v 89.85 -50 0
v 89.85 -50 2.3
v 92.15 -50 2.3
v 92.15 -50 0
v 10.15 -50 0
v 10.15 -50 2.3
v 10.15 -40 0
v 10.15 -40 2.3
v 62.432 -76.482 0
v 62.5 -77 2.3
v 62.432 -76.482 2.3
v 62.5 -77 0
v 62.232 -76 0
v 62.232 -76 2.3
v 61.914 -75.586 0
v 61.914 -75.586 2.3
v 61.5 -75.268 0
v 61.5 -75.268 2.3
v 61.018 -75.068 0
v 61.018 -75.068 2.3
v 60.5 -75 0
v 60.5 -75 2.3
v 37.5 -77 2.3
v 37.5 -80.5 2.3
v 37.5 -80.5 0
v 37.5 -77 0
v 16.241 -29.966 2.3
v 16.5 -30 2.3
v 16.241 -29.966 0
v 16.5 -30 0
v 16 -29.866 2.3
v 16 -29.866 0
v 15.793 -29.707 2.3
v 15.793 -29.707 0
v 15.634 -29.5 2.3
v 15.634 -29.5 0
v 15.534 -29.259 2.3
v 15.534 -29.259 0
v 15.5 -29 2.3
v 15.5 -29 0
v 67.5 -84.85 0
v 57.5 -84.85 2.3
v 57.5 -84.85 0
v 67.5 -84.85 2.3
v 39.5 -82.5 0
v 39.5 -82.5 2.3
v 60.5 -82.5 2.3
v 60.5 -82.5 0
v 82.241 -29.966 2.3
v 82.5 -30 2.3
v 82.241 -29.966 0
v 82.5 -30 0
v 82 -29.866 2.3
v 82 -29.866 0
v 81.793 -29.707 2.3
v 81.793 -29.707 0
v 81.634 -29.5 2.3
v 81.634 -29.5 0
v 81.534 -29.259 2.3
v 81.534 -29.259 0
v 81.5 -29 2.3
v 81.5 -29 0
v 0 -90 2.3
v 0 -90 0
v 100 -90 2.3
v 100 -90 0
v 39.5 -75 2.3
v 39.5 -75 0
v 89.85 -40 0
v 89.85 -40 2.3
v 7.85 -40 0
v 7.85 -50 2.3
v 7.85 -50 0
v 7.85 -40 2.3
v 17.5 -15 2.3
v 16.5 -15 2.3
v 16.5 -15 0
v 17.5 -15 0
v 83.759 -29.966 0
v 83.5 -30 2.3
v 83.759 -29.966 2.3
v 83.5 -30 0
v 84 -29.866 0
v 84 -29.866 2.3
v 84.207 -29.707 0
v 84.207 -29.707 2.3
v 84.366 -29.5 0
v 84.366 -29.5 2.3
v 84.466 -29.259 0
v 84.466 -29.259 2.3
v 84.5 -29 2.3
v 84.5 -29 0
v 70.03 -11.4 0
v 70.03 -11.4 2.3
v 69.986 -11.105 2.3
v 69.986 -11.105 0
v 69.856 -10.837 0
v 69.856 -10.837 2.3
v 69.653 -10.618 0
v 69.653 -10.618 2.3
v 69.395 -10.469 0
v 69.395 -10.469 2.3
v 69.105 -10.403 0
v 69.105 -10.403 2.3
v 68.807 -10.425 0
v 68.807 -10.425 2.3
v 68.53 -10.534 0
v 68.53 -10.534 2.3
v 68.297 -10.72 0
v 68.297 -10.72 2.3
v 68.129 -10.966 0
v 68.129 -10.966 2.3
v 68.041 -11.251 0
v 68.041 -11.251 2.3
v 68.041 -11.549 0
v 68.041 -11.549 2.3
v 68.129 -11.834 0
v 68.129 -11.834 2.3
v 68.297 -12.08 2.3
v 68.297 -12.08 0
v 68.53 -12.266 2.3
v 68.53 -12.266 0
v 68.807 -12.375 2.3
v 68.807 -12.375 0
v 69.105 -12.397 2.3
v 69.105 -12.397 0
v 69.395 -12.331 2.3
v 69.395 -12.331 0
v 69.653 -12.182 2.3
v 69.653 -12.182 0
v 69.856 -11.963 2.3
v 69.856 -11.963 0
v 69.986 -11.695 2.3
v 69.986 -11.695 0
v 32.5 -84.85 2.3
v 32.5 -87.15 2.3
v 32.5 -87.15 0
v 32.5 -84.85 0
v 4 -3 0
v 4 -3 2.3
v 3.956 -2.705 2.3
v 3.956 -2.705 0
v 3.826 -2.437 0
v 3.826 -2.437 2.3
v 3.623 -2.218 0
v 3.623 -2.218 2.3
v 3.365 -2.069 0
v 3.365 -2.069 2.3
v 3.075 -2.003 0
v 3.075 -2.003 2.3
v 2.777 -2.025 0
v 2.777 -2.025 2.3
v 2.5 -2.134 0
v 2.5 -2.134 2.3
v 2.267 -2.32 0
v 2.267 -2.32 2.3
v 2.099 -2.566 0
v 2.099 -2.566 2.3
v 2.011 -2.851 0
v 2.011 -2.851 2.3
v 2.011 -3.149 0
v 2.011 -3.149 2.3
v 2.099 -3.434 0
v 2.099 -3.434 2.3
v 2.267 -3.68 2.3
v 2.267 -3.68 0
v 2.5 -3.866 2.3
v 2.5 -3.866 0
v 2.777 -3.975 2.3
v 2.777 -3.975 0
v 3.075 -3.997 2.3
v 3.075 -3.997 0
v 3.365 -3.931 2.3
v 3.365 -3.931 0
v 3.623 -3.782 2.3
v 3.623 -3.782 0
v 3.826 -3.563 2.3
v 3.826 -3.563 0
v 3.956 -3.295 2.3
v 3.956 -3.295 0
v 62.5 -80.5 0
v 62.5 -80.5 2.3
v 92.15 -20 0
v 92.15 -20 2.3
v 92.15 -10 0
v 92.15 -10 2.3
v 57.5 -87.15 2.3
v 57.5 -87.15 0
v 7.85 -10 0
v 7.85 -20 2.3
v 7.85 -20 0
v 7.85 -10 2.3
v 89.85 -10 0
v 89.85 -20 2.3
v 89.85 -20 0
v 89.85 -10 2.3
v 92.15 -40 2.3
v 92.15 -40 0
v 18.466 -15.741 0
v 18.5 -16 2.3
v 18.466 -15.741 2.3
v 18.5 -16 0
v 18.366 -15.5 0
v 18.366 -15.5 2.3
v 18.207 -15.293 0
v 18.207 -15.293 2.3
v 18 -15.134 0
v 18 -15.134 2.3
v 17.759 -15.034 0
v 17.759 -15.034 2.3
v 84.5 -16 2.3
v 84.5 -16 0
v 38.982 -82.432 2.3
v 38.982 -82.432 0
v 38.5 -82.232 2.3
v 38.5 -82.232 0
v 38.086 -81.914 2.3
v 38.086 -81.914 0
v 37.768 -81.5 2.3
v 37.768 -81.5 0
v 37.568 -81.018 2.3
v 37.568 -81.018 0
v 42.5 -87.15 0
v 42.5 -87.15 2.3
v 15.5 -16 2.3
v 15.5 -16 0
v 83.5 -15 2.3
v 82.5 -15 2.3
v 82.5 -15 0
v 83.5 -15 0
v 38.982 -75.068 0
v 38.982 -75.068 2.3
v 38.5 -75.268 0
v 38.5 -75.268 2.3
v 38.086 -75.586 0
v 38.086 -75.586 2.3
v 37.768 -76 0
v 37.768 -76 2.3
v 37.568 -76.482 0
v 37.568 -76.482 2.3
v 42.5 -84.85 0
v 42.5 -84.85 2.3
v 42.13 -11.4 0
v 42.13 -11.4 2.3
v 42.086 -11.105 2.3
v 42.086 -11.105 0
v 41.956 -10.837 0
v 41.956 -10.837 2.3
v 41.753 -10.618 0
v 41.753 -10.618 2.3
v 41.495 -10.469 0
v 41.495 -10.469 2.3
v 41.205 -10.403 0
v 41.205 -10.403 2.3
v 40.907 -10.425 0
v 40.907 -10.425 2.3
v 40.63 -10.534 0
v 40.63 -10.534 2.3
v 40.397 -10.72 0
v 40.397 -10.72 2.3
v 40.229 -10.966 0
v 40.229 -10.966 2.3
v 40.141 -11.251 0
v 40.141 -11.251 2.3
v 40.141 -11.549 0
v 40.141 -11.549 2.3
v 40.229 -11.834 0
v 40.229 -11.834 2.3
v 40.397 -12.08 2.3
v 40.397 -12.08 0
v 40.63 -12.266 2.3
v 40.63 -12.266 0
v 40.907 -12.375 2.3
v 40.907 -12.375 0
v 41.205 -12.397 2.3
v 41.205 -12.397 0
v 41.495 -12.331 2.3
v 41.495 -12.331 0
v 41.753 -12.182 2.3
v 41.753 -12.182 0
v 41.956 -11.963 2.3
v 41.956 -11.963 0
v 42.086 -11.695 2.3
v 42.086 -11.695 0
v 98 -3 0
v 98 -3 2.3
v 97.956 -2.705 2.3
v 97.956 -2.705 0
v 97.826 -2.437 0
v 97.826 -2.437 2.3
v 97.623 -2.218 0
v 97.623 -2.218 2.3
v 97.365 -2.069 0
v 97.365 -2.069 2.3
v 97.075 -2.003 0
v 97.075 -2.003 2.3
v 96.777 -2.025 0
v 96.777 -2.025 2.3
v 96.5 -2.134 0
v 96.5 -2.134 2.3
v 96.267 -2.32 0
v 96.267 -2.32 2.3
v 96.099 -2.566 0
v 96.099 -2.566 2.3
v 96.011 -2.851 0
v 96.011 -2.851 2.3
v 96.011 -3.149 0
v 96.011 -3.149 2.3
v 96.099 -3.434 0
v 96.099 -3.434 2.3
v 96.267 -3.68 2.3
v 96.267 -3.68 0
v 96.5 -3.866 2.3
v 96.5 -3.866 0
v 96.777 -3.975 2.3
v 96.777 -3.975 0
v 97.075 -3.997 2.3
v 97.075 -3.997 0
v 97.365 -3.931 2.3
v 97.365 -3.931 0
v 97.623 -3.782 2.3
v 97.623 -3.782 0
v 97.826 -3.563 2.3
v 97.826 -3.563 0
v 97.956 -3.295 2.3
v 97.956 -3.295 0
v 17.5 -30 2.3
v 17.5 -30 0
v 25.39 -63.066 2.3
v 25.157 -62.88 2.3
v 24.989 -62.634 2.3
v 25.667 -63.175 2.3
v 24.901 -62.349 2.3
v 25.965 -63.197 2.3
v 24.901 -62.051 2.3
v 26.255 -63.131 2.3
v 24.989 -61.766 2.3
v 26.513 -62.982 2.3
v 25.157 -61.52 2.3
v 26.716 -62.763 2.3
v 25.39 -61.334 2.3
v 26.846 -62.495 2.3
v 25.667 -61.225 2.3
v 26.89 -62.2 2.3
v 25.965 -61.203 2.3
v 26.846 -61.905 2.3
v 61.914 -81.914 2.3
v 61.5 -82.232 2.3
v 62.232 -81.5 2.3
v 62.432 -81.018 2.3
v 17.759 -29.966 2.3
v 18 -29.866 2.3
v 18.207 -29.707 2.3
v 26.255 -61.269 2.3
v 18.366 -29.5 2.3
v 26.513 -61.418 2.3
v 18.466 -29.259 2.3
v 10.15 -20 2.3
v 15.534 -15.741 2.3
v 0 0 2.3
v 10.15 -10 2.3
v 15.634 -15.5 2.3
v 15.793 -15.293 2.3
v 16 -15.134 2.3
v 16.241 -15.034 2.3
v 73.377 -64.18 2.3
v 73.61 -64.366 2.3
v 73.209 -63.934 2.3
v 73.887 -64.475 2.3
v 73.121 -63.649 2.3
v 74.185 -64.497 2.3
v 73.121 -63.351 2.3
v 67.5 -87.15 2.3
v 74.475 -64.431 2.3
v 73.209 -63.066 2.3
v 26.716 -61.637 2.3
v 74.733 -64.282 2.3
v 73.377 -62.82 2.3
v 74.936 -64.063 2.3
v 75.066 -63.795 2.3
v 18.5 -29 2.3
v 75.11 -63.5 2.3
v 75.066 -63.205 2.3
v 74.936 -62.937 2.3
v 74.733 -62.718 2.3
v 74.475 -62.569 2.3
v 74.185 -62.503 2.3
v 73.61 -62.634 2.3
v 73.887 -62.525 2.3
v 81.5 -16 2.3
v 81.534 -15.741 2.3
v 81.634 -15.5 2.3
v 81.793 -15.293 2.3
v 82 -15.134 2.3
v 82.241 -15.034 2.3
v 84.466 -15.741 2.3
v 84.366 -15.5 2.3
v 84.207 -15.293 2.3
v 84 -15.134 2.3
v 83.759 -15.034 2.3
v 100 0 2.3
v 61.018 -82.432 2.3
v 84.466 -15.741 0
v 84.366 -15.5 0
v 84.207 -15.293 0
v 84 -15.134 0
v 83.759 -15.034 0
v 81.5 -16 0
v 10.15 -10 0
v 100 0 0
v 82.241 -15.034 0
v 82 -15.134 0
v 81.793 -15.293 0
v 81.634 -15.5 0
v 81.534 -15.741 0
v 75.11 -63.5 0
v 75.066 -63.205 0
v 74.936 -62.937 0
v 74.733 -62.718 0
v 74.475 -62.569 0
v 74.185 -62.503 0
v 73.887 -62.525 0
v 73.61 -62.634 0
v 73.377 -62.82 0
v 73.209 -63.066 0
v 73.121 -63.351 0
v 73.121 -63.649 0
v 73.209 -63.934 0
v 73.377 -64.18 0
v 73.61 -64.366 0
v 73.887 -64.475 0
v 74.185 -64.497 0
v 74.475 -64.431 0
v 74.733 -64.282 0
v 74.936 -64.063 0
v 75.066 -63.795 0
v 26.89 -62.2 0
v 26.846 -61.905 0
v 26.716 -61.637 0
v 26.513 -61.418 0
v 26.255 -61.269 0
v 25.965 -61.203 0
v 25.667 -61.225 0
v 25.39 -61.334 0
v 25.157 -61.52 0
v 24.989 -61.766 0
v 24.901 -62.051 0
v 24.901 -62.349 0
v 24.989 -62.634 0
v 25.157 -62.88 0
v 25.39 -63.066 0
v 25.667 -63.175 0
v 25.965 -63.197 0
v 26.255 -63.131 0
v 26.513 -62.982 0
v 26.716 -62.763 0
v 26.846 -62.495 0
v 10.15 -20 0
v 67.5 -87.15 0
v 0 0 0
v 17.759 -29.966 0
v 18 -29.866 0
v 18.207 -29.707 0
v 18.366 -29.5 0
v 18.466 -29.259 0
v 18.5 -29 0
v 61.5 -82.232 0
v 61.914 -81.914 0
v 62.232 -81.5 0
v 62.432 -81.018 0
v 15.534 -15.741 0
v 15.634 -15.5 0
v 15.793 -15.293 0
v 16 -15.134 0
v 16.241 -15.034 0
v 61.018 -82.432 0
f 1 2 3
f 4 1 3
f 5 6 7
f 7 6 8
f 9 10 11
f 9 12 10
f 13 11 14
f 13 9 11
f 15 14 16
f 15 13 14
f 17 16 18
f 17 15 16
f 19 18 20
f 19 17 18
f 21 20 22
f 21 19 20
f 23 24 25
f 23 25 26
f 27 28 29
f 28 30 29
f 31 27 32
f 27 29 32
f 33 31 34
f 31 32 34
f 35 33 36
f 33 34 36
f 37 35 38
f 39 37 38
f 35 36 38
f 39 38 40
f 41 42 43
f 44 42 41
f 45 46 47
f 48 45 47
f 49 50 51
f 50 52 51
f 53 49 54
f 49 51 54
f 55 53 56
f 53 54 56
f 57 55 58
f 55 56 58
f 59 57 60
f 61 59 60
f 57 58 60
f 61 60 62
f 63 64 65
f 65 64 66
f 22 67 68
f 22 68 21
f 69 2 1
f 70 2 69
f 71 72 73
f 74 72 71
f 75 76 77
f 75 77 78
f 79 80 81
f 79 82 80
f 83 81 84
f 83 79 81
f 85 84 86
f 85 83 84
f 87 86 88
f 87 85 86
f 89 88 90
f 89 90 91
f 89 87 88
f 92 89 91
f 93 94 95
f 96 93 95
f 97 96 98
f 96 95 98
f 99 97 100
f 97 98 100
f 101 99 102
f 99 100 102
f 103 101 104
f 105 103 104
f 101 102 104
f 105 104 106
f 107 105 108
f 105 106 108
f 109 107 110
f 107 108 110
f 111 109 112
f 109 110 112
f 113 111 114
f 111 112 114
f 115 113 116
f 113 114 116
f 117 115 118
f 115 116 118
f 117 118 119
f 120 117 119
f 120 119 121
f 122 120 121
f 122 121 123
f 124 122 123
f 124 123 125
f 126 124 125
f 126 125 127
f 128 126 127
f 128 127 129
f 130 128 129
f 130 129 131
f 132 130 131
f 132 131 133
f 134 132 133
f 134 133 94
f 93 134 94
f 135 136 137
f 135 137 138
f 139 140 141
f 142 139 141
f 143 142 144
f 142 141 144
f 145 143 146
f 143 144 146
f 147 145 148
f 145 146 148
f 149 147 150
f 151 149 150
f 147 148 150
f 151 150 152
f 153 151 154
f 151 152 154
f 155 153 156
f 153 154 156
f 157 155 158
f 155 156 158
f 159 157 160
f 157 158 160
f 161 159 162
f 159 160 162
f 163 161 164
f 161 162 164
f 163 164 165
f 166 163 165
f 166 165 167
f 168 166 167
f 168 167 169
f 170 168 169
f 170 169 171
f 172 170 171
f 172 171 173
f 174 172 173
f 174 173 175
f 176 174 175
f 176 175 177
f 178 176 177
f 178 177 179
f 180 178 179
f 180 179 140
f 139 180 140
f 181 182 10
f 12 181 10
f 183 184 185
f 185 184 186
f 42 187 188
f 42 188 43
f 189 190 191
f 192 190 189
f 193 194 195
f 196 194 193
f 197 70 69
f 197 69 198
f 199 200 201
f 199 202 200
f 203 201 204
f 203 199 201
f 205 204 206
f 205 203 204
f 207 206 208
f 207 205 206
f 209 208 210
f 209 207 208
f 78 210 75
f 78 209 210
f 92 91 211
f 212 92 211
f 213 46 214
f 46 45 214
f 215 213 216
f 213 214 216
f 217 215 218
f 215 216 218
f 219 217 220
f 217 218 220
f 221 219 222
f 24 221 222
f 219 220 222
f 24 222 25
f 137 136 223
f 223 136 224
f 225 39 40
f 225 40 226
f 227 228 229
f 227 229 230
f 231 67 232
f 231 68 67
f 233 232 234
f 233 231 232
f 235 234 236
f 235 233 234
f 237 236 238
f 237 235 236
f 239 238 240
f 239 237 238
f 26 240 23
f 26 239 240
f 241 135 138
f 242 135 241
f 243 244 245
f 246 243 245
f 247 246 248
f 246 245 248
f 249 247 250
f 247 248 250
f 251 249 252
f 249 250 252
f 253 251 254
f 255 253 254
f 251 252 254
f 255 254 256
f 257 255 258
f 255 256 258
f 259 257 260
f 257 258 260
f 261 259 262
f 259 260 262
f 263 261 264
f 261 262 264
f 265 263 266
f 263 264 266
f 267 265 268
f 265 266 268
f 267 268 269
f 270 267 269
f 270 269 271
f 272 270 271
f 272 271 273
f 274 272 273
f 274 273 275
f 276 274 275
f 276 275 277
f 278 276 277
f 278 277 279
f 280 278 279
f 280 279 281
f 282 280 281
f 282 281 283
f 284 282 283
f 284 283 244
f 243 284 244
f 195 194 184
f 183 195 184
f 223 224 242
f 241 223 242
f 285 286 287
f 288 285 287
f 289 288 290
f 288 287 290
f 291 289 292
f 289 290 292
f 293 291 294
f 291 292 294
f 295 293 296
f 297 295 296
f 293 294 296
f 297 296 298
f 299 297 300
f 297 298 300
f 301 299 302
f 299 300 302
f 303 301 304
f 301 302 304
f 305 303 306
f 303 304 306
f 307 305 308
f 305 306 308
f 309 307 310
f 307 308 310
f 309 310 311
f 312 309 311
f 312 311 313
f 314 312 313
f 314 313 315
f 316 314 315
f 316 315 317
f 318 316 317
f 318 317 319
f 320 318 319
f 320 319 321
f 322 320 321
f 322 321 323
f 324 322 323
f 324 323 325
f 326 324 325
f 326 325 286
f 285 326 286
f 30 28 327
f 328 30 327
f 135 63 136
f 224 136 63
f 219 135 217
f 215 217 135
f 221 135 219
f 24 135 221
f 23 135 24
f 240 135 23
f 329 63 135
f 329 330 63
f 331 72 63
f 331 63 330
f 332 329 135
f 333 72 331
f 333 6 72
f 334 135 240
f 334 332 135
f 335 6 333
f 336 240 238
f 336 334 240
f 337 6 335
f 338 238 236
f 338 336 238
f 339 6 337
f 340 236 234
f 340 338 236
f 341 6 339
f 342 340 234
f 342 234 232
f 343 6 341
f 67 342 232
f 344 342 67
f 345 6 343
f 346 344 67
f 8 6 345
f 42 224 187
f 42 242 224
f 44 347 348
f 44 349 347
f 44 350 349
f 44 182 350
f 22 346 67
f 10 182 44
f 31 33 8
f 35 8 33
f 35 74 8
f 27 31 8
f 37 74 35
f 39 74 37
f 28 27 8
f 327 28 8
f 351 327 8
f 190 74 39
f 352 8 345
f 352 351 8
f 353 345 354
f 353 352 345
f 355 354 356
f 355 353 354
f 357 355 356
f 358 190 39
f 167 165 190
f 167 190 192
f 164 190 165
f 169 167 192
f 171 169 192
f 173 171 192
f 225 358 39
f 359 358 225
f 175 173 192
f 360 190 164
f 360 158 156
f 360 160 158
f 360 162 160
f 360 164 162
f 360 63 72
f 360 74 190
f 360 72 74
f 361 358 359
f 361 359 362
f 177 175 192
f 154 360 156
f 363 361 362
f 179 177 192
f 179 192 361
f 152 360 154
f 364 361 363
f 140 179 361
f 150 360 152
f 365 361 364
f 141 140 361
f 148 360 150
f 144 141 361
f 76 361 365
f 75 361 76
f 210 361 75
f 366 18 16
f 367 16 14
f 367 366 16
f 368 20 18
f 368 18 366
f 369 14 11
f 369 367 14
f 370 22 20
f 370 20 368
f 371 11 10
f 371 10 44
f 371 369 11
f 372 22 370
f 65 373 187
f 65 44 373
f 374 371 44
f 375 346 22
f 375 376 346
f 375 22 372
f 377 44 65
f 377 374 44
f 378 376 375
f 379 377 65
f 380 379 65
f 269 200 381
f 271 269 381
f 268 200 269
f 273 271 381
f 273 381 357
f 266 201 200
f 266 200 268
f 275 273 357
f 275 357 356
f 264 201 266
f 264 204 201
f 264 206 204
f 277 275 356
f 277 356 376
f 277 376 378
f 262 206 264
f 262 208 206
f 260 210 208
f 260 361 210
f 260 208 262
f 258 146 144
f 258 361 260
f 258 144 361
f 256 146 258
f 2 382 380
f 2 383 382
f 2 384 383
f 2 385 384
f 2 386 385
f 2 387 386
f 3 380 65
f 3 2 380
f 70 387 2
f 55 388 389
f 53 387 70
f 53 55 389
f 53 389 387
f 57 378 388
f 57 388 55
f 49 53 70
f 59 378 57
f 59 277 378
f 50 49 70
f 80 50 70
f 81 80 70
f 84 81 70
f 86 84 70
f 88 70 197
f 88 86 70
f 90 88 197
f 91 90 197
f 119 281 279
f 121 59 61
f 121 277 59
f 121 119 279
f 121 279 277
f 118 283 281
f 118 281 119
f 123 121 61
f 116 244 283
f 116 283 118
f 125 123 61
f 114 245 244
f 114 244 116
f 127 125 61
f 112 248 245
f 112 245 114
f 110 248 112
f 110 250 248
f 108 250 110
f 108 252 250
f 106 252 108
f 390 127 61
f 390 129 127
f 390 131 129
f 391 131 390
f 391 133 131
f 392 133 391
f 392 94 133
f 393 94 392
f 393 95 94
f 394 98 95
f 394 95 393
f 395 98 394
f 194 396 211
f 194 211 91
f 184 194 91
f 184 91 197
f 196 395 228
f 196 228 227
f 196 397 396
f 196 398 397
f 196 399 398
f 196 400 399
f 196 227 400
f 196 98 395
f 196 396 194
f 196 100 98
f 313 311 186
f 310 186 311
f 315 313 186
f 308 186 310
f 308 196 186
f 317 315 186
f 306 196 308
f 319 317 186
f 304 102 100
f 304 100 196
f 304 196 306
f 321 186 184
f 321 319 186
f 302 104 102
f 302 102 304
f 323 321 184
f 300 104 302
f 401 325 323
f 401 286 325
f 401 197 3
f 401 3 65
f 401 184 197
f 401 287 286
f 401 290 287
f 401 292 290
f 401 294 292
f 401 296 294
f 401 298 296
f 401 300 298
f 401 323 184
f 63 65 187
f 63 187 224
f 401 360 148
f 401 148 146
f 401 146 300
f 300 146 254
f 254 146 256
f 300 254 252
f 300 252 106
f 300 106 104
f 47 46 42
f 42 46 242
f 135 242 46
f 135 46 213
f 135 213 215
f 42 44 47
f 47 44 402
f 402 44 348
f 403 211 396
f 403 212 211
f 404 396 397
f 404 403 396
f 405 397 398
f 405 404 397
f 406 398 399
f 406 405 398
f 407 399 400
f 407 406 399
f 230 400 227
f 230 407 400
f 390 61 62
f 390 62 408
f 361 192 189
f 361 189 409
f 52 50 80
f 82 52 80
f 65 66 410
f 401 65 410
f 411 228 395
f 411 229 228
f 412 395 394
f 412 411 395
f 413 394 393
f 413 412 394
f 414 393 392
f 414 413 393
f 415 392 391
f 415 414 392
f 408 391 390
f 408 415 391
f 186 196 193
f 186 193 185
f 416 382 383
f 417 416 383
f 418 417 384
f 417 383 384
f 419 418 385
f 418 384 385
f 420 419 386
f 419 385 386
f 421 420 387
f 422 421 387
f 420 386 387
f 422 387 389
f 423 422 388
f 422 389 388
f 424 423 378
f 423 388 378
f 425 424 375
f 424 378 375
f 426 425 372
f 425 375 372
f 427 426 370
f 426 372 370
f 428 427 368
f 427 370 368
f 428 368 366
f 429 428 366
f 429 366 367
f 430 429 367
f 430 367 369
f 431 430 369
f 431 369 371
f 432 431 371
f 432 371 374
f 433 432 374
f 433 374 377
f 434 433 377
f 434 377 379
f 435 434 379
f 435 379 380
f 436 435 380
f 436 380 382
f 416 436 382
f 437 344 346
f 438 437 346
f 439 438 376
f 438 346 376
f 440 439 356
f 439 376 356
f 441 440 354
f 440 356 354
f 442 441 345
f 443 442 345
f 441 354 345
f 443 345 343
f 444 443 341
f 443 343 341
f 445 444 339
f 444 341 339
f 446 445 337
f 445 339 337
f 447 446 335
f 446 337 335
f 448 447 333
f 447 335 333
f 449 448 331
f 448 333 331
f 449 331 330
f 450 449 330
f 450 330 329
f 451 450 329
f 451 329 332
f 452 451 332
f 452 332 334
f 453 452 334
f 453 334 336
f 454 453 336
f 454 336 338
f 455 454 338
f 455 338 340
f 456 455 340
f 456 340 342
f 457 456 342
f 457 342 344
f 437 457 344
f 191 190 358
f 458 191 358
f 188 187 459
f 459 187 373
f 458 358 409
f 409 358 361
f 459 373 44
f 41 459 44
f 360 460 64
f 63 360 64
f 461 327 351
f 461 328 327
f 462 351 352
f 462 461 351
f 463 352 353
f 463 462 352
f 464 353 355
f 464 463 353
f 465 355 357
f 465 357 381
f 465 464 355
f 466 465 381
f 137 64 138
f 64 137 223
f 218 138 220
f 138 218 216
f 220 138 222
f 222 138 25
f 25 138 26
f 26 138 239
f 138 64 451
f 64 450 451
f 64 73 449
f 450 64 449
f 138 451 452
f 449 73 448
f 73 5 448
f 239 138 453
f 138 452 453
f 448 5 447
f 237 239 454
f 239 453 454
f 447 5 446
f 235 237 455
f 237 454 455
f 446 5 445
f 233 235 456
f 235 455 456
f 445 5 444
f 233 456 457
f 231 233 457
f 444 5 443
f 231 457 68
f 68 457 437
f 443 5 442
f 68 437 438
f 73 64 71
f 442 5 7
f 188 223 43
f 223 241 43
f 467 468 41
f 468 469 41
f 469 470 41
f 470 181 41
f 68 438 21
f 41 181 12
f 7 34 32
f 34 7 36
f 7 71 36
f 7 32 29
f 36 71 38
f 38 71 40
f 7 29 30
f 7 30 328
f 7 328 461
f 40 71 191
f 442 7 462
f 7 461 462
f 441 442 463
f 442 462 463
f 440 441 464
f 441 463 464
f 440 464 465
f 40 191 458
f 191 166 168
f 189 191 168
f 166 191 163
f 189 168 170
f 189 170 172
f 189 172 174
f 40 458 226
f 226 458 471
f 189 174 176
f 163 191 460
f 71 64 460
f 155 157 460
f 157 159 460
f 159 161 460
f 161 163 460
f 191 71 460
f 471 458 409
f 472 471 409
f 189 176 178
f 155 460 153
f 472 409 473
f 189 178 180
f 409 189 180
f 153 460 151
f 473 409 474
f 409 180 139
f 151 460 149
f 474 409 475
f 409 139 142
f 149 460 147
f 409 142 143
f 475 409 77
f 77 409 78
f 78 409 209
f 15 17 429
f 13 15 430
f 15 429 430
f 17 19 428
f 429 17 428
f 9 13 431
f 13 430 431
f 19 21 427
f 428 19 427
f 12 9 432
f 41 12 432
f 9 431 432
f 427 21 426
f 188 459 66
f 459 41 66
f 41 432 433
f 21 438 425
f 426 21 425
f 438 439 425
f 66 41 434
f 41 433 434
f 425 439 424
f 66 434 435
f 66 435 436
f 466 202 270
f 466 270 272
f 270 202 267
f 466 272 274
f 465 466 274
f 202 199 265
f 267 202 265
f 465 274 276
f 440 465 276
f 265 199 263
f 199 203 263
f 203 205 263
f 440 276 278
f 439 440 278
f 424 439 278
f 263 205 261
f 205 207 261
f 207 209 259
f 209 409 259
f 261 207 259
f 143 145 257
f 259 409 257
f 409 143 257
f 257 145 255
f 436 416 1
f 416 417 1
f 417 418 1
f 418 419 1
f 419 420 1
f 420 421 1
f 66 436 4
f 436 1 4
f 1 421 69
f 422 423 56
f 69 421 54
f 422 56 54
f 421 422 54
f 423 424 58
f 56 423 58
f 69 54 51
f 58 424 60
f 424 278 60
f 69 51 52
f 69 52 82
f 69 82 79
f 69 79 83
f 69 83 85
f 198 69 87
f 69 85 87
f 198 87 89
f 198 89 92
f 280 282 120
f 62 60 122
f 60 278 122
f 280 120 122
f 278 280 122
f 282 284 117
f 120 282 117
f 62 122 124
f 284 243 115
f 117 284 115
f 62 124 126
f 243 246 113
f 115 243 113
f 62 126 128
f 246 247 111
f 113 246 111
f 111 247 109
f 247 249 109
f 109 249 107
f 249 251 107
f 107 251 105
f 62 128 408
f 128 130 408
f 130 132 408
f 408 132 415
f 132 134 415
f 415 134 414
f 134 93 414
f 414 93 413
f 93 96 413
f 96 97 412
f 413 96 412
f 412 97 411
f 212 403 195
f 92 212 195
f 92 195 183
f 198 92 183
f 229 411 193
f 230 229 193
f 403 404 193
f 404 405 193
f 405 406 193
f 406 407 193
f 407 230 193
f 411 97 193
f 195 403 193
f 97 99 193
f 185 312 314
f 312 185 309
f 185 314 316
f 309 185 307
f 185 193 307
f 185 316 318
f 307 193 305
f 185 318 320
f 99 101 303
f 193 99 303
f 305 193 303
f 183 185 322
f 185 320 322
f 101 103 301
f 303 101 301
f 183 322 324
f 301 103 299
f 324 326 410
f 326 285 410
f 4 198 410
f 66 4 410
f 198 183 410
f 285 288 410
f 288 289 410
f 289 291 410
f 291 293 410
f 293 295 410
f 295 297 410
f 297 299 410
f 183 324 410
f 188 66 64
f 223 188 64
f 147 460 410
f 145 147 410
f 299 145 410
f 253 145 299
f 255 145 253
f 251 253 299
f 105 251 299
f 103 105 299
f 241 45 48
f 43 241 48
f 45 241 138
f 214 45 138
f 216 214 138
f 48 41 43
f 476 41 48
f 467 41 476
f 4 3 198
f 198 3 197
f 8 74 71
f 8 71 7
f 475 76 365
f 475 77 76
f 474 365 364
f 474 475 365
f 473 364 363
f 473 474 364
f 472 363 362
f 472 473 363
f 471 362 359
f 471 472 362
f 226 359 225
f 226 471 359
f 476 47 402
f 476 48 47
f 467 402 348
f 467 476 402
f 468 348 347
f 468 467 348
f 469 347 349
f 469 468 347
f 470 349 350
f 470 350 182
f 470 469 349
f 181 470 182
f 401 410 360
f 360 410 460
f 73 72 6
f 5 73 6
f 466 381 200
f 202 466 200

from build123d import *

# Parameters (mm, degrees)
BOSS_EXTRUDE1_DEPTH = 2.3
SKETCH7_W           = 2.3
SKETCH7_H           = 10
SKETCH7_W_2         = 10
SKETCH7_H_2         = 2.3
CUT_EXTRUDE2_DEPTH  = 3.3
SKETCH9_R           = 1
CUT_EXTRUDE4_DEPTH  = 3.3
SKETCH10_W          = 3
SKETCH10_H          = 15
SKETCH10_W_2        = 25
SKETCH10_H_2        = 7.5
CUT_EXTRUDE5_DEPTH  = 3.3
FILLET2_R           = 1
FILLET3_R           = 2


with BuildPart() as part:
    # Sketch1 → Boss-Extrude1 (new body)
    with BuildSketch(Plane.XY):
        Polygon((0, -57), (0, -90), (23, -90), (77, -90), (100, -90), (100, -57), (100, 0), (0, 0), align=None)
    extrude(amount=BOSS_EXTRUDE1_DEPTH)

    # Sketch7 → Cut-Extrude2 (cut, through all)
    with BuildSketch(Plane.XY.offset(2.3)):
        with Locations((91, -15)):
            Rectangle(SKETCH7_W, SKETCH7_H)
        with Locations((91, -45)):
            Rectangle(SKETCH7_W, SKETCH7_H)
        with Locations((9, -15)):
            Rectangle(SKETCH7_W, SKETCH7_H)
        with Locations((9, -45)):
            Rectangle(SKETCH7_W, SKETCH7_H)
        with Locations((37.5, -86)):
            Rectangle(SKETCH7_W_2, SKETCH7_H_2)
        with Locations((62.5, -86)):
            Rectangle(SKETCH7_W_2, SKETCH7_H_2)
    extrude(amount=-CUT_EXTRUDE2_DEPTH, mode=Mode.SUBTRACT)

    # Sketch9 → Cut-Extrude4 (cut, through all)
    with BuildSketch(Plane.XY.offset(2.3)):
        with Locations((3, -3)):
            Circle(SKETCH9_R)
        with Locations((97, -3)):
            Circle(SKETCH9_R)
        with Locations((41.13, -11.4)):
            Circle(SKETCH9_R)
        with Locations((69.03, -11.4)):
            Circle(SKETCH9_R)
        with Locations((25.89, -62.2)):
            Circle(SKETCH9_R)
        with Locations((74.11, -63.5)):
            Circle(SKETCH9_R)
    extrude(amount=-CUT_EXTRUDE4_DEPTH, mode=Mode.SUBTRACT)

    # Sketch10 → Cut-Extrude5 (cut, through all)
    with BuildSketch(Plane.XY.offset(2.3)):
        with Locations((17, -22.5)):
            Rectangle(SKETCH10_W, SKETCH10_H)
        with Locations((83, -22.5)):
            Rectangle(SKETCH10_W, SKETCH10_H)
        with Locations((50, -78.75)):
            Rectangle(SKETCH10_W_2, SKETCH10_H_2)
    extrude(amount=-CUT_EXTRUDE5_DEPTH, mode=Mode.SUBTRACT)

    # Fillet2
    fillet2_edges = [part.edges().sort_by_distance(p)[0] for p in [
        (15.5, -30, 1.15),
        (15.5, -15, 1.15),
        (18.5, -15, 1.15),
        (18.5, -30, 1.15),
        (81.5, -30, 1.15),
        (81.5, -15, 1.15),
        (84.5, -15, 1.15),
        (84.5, -30, 1.15),
    ]]
    fillet(fillet2_edges, radius=FILLET2_R)

    # Fillet3
    fillet3_edges = [part.edges().sort_by_distance(p)[0] for p in [
        (37.5, -82.5, 1.15),
        (37.5, -75, 1.15),
        (62.5, -75, 1.15),
        (62.5, -82.5, 1.15),
    ]]
    fillet(fillet3_edges, radius=FILLET3_R)


solid = part.part
